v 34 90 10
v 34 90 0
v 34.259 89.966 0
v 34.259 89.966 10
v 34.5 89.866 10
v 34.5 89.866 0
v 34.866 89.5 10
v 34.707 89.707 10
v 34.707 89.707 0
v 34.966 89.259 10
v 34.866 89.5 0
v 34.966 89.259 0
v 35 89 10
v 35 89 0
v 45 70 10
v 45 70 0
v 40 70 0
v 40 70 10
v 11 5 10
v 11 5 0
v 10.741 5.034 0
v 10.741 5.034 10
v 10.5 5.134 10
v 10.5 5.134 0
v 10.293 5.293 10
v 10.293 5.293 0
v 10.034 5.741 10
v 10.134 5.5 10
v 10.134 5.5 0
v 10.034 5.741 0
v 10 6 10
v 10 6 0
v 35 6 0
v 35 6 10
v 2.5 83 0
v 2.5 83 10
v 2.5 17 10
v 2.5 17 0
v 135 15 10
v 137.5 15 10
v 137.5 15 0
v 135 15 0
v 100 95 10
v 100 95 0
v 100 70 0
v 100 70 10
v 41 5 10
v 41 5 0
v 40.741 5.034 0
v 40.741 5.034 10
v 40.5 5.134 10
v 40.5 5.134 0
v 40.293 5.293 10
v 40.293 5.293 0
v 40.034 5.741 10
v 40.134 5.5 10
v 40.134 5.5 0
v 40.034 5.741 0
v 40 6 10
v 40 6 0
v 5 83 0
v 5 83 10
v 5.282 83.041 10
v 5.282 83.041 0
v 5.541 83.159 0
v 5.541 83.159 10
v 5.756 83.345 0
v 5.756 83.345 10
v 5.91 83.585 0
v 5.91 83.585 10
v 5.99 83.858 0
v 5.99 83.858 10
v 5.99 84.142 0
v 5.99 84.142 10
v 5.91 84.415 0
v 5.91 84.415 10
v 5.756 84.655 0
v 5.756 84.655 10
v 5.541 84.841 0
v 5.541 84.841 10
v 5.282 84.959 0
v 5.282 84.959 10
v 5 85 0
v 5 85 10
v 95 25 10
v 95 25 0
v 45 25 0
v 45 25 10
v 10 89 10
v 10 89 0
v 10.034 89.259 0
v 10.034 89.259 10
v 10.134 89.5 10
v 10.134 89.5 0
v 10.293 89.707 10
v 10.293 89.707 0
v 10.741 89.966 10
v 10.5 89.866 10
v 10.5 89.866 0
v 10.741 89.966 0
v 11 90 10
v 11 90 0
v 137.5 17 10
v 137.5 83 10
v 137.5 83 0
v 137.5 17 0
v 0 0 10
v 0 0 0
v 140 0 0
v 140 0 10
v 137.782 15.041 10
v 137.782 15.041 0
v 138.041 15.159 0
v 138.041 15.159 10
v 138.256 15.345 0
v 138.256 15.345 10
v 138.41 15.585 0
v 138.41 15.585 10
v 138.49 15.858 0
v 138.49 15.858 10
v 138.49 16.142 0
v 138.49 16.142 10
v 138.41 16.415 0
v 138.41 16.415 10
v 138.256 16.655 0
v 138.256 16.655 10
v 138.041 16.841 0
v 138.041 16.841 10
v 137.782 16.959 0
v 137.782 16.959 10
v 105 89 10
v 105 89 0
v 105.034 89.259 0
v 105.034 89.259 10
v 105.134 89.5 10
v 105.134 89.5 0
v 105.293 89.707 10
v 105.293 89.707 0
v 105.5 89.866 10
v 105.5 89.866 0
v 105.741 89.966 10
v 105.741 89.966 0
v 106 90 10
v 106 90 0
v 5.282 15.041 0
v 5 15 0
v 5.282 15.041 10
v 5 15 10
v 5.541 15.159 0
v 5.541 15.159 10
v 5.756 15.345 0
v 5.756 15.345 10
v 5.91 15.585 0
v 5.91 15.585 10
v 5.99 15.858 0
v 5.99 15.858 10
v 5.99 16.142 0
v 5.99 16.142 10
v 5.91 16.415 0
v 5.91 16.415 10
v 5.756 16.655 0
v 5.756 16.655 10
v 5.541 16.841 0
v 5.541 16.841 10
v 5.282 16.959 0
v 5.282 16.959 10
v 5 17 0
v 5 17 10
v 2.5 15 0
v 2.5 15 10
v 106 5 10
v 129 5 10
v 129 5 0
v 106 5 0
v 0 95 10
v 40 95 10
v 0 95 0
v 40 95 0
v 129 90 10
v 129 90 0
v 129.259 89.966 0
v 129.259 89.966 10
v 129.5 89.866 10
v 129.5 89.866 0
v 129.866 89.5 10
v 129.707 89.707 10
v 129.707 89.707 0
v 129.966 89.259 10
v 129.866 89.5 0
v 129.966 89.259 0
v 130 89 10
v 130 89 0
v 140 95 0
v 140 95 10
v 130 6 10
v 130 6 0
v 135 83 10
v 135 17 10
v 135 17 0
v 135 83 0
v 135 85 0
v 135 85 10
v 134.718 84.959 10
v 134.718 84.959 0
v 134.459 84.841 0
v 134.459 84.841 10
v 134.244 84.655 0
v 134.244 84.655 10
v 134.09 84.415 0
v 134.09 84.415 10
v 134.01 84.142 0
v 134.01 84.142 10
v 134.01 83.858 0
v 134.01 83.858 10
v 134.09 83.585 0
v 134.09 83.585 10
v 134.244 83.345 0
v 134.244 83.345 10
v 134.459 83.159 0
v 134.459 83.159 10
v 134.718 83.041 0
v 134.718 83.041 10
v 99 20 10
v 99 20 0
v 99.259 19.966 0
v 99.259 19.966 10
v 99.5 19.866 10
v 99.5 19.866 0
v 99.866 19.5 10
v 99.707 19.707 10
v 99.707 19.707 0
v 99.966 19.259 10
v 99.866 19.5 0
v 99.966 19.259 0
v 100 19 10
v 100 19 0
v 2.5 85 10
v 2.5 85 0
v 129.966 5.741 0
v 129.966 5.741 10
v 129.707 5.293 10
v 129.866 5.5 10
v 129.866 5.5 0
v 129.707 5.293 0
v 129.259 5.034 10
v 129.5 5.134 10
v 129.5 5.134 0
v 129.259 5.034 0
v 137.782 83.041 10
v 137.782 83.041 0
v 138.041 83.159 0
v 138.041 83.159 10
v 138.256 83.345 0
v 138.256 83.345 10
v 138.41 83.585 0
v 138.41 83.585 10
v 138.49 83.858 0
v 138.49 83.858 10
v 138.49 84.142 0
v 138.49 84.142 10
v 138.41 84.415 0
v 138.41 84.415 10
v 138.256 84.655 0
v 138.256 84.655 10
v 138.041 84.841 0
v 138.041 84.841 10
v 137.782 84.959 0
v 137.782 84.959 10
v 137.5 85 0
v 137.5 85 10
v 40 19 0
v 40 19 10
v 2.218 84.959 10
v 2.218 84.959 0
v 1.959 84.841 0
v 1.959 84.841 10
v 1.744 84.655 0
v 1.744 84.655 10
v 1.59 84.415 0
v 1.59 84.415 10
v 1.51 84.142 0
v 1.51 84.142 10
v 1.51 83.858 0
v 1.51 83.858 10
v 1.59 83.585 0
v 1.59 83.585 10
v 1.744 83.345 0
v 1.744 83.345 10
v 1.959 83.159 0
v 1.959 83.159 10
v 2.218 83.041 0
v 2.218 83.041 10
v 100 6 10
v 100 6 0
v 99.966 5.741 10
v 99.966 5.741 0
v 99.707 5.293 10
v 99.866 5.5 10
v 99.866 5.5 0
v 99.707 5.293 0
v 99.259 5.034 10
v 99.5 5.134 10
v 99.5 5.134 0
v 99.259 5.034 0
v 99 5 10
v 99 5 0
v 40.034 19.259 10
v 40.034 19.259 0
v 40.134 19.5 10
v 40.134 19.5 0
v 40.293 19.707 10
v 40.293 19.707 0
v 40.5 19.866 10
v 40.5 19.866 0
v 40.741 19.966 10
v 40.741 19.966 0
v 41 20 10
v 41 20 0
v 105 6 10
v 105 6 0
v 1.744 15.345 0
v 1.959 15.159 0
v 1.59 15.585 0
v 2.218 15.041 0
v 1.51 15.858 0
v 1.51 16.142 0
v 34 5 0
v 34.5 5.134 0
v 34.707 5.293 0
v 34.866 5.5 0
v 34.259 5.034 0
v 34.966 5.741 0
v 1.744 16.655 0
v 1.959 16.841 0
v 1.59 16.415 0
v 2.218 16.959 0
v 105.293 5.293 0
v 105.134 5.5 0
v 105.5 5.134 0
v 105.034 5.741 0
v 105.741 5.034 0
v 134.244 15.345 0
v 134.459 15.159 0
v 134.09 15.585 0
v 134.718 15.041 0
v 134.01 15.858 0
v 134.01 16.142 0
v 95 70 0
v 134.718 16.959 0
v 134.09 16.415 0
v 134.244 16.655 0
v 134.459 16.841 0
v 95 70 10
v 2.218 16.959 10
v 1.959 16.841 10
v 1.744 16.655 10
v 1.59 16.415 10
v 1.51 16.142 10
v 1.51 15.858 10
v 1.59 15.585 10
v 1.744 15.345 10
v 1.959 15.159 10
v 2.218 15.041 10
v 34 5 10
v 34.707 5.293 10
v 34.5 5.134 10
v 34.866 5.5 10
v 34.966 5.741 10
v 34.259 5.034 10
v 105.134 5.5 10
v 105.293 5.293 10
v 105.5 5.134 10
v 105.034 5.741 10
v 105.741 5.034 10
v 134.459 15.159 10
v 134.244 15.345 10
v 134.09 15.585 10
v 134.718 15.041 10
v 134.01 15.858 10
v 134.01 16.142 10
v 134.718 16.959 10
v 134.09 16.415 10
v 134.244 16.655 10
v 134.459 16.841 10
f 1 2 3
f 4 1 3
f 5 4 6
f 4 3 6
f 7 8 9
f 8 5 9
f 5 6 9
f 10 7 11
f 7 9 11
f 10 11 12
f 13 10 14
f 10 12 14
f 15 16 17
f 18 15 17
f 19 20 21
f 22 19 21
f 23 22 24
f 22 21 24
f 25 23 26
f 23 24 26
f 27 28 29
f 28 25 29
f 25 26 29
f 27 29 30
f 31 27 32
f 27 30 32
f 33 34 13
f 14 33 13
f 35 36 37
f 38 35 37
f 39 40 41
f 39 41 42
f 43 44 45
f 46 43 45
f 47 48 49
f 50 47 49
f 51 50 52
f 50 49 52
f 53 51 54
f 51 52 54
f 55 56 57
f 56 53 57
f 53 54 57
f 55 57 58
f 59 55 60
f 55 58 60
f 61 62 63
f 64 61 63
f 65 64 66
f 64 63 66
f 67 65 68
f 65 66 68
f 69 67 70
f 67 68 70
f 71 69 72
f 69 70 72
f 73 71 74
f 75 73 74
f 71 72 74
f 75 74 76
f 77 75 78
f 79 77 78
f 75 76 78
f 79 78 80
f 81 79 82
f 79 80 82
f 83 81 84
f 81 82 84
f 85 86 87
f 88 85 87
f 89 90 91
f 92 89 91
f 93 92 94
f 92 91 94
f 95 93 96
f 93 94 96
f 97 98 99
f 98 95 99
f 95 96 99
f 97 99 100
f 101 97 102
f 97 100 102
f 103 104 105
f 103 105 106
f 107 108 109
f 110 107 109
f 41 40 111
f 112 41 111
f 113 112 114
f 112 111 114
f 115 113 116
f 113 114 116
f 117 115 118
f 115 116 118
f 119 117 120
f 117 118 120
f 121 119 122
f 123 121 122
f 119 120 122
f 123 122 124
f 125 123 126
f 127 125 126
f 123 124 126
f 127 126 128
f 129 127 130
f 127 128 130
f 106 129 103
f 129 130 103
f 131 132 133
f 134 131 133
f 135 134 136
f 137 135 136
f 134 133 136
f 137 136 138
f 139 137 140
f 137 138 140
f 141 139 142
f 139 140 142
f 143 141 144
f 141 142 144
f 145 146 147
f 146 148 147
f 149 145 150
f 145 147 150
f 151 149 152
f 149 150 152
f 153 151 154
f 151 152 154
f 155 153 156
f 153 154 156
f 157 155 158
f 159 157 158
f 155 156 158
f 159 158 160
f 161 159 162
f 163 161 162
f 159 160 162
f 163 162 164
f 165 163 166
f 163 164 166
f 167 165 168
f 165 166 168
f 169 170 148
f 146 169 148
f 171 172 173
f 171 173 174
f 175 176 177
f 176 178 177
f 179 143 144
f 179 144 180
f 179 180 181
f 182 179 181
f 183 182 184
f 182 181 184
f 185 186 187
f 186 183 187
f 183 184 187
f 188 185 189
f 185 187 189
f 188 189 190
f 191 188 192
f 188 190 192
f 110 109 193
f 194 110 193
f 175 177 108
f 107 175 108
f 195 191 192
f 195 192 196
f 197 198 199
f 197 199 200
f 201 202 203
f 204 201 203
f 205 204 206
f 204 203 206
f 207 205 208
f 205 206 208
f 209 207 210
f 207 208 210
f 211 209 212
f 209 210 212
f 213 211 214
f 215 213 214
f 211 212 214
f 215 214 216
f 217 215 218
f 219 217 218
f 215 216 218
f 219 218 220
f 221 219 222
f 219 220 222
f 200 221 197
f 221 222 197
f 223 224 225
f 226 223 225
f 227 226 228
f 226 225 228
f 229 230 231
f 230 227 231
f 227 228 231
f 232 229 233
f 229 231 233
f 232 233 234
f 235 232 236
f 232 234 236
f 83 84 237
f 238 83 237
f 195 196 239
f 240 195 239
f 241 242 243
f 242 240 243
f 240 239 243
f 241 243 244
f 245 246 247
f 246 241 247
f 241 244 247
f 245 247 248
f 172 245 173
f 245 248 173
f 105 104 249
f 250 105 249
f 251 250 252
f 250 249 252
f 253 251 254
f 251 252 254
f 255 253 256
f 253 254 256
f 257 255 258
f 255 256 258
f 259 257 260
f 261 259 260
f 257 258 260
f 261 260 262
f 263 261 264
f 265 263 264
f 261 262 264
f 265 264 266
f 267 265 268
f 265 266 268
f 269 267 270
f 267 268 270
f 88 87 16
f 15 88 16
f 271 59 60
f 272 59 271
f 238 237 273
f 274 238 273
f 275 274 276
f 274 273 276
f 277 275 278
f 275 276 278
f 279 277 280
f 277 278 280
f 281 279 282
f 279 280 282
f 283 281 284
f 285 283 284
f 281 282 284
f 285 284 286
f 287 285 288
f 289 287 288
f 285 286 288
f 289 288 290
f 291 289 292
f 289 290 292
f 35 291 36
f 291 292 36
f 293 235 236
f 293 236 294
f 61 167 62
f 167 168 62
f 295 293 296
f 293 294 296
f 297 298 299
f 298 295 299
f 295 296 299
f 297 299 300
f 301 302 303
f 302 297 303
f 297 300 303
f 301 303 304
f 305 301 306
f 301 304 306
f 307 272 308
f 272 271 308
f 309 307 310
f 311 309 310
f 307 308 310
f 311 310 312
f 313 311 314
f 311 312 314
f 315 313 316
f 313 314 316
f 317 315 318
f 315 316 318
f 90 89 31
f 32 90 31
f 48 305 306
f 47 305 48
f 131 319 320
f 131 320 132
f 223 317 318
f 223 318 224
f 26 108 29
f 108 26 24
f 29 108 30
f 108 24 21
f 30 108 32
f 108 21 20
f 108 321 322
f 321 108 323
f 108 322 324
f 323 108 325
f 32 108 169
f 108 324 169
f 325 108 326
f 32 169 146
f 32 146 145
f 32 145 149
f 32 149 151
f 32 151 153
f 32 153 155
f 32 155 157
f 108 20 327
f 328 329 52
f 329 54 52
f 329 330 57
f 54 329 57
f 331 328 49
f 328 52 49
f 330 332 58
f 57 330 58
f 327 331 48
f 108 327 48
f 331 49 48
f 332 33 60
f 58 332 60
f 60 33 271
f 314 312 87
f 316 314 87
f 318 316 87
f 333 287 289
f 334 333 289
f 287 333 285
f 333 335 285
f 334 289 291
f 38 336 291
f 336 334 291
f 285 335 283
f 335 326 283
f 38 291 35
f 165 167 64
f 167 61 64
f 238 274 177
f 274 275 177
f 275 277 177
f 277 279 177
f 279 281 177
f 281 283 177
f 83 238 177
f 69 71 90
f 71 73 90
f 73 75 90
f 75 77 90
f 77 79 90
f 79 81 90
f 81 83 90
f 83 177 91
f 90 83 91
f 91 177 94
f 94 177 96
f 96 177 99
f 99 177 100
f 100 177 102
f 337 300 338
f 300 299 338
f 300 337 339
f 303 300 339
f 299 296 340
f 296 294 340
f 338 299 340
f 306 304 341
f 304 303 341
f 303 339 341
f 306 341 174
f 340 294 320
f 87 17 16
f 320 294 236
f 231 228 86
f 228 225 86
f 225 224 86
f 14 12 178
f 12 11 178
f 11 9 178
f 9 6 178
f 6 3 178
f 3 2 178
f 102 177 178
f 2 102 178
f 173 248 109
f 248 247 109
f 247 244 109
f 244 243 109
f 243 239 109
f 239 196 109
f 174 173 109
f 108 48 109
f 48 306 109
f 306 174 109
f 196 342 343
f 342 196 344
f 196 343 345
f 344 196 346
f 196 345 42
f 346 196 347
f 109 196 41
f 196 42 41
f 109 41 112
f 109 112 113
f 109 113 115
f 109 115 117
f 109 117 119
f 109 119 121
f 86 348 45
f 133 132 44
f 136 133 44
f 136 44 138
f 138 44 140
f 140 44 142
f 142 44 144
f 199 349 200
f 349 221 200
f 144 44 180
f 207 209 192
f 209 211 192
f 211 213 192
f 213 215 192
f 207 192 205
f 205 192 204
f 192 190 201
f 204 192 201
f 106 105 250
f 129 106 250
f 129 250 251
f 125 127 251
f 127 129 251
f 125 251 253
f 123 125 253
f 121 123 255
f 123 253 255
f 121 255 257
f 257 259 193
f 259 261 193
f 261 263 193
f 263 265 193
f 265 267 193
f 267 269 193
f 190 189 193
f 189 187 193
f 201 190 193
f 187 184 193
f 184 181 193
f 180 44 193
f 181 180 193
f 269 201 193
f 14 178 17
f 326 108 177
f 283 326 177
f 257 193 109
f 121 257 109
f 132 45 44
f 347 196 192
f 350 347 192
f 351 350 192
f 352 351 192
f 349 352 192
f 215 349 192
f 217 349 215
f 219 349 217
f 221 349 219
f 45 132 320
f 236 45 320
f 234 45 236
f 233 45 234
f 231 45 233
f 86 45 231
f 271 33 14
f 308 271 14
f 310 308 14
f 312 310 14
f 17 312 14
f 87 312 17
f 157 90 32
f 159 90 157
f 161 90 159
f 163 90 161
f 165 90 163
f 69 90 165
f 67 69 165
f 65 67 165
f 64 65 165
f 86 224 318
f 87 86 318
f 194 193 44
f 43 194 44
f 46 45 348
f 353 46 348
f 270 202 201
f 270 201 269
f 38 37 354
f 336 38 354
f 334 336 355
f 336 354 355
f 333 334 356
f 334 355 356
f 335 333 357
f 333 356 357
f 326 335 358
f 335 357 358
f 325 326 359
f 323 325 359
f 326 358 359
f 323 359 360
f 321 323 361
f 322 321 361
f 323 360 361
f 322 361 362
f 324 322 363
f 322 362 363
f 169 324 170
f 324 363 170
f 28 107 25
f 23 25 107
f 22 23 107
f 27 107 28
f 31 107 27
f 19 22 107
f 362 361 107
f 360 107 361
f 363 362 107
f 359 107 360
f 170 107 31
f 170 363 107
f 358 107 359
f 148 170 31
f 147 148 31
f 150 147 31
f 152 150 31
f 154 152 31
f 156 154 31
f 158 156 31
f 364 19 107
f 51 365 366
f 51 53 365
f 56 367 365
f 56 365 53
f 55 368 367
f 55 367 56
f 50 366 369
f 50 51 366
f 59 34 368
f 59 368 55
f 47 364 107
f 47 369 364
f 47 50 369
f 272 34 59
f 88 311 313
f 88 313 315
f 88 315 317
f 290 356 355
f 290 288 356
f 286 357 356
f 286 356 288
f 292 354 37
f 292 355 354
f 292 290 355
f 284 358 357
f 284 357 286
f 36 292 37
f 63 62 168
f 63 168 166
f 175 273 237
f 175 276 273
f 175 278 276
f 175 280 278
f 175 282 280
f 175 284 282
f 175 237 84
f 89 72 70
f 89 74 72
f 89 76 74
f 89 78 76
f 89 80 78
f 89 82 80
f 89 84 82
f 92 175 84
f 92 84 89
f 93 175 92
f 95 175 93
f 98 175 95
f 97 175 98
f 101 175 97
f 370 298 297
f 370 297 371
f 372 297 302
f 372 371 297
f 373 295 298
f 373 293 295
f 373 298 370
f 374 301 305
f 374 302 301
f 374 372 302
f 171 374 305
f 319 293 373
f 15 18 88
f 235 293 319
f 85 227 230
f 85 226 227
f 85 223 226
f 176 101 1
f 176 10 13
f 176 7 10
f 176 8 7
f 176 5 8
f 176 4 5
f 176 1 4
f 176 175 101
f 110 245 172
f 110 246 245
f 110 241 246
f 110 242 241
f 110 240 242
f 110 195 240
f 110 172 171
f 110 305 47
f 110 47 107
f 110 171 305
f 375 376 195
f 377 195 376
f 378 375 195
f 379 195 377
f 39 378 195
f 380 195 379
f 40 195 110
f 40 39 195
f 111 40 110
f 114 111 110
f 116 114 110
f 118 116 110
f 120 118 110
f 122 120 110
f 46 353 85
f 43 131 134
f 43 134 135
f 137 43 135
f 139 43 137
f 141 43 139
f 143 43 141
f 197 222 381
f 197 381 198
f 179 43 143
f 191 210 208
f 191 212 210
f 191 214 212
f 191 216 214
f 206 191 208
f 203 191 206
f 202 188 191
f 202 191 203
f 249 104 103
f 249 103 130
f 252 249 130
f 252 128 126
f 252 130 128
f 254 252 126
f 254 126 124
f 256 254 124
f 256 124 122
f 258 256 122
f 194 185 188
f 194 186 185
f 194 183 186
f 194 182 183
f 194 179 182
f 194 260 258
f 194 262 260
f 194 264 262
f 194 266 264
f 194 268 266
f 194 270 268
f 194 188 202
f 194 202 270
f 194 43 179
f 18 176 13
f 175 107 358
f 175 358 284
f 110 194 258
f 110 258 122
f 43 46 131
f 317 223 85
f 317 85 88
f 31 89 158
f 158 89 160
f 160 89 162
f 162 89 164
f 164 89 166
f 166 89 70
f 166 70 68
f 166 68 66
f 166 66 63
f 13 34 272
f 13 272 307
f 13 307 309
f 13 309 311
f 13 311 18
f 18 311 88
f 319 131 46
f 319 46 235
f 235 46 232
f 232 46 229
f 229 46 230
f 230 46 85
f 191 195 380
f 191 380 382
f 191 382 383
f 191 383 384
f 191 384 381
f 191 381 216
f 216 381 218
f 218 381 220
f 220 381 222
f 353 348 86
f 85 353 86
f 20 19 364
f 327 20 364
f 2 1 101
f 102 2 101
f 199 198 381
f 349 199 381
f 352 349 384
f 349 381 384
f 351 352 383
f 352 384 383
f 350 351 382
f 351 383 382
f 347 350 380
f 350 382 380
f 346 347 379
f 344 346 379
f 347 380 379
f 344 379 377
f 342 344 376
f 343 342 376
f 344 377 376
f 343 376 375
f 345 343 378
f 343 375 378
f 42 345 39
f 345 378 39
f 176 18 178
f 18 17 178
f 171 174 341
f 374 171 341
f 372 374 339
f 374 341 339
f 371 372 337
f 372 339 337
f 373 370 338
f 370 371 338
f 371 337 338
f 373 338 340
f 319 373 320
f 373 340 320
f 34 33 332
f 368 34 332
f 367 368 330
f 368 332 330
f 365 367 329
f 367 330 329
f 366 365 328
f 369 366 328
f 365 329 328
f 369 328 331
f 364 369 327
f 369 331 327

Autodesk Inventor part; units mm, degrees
ref_plane "YZ Plane" through (0, 0, 0) normal (1, 0, 0) x (0, 1, 0)
ref_plane "XZ Plane" through (0, 0, 0) normal (0, 1, 0) x (-1, 0, 0)
ref_plane "XY Plane" through (0, 0, 0) normal (0, 0, 1) x (1, 0, 0)
sketch "スケッチ1" plane through (0, 0, 0) normal (0, 0, 1) x (1, 0, 0)
  line L0 (0, 0) -> (140, 0)
  line L1 (140, 0) -> (140, 95)
  line L2 (0, 95) -> (0, 0)
  line L3 (70, 94.6562) -> (70, 0) construction
  line L4 (95, 70) -> (95, 25)
  line L5 (95, 25) -> (45, 25)
  line L6 (45, 25) -> (45, 70)
  line L7 (140, 95) -> (100, 95)
  line L8 (40, 95) -> (0, 95)
  line L9 (100, 95) -> (100, 70)
  line L10 (40, 70) -> (40, 95)
  line L11 (100, 70) -> (95, 70)
  line L12 (45, 70) -> (40, 70)
  dimension "d0" = 140
  dimension "d1" = 95
  dimension "d2" = 25
  dimension "d3" = 50
  dimension "d4" = 60
  dimension "d6" = 25
extrude "押し出し1" add sketch "スケッチ1" along normal blind 10
sketch "スケッチ2" plane through (0, 0, 10) normal (0, 0, 1) x (1, 0, 0)
  line L0 (0, 0) -> (140, 0) projected
  line L1 (70, 0) -> (70, 25) construction
  line L2 (95, 25) -> (45, 25) projected
  line L3 (135, 85) -> (137.5, 85)
  line L4 (137.5, 83) -> (137.5, 17)
  line L5 (137.5, 15) -> (135, 15)
  line L6 (135, 17) -> (135, 83)
  line L7 (140, 95) -> (100, 95) projected
  line L8 (140, 0) -> (140, 95) projected
  arc A0 (135, 85) -> (135, 83) centre (135, 84) ccw
  arc A1 (137.5, 83) -> (137.5, 85) centre (137.5, 84) ccw
  arc A2 (135, 17) -> (135, 15) centre (135, 16) ccw
  arc A3 (137.5, 15) -> (137.5, 17) centre (137.5, 16) ccw
  line L9 (5, 85) -> (2.5, 85)
  line L10 (2.5, 83) -> (2.5, 17)
  line L11 (2.5, 15) -> (5, 15)
  line L12 (5, 17) -> (5, 83)
  arc A4 (5, 83) -> (5, 85) centre (5, 84) ccw
  arc A5 (2.5, 85) -> (2.5, 83) centre (2.5, 84) ccw
  arc A6 (5, 15) -> (5, 17) centre (5, 16) ccw
  arc A7 (2.5, 17) -> (2.5, 15) centre (2.5, 16) ccw
  dimension "d9" = 15
  dimension "d10" = 10
  dimension "d11" = 2.5
  dimension "d12" = 2.5
  dimension "d16" = 2
  dimension "d17" = 1
  dimension "d18" = 2
  dimension "d19" = 1
extrude "押し出し2" cut sketch "スケッチ2" against normal through all
sketch "スケッチ3" plane through (0, 0, 10) normal (0, 0, 1) x (1, 0, 0)
  line L0 (40, 20) -> (100, 20)
  line L1 (100, 20) -> (100, 5)
  line L2 (100, 5) -> (40, 5)
  line L3 (40, 5) -> (40, 20)
  arc A0 (135, 85) -> (135, 83) centre (135, 84) ccw projected
  line L4 (135, 85) -> (137.5, 85) projected
  arc A1 (137.5, 83) -> (137.5, 85) centre (137.5, 84) ccw projected
  line L5 (137.5, 83) -> (137.5, 17) projected
  arc A2 (137.5, 15) -> (137.5, 17) centre (137.5, 16) ccw projected
  line L6 (137.5, 15) -> (135, 15) projected
  arc A3 (135, 17) -> (135, 15) centre (135, 16) ccw projected
  line L7 (135, 17) -> (135, 83) projected
  arc A4 (5, 83) -> (5, 85) centre (5, 84) ccw projected
  line L8 (5, 83) -> (5, 17) projected
  arc A5 (5, 15) -> (5, 17) centre (5, 16) ccw projected
  line L9 (5, 15) -> (2.5, 15) projected
  arc A6 (2.5, 17) -> (2.5, 15) centre (2.5, 16) ccw projected
  line L10 (2.5, 17) -> (2.5, 83) projected
  arc A7 (2.5, 85) -> (2.5, 83) centre (2.5, 84) ccw projected
  line L11 (2.5, 85) -> (5, 85) projected
  line L12 (140, 0) -> (140, 95) projected
  line L13 (140, 95) -> (100, 95) projected
  line L14 (100, 95) -> (100, 70) projected
  line L15 (100, 70) -> (95, 70) projected
  line L16 (95, 70) -> (95, 25) projected
  line L17 (95, 25) -> (45, 25) projected
  line L18 (45, 25) -> (45, 70) projected
  line L19 (45, 70) -> (40, 70) projected
  line L20 (40, 70) -> (40, 95) projected
  line L21 (40, 95) -> (0, 95) projected
  line L22 (0, 95) -> (0, 0) projected
  line L23 (0, 0) -> (140, 0) projected
  line L24 (45, 25) -> (45, 70) projected
  line L25 (95, 70) -> (95, 25) projected
  line L26 (105, 90) -> (130, 90)
  line L27 (130, 90) -> (130, 5)
  line L28 (130, 5) -> (105, 5)
  line L29 (105, 5) -> (105, 90)
  line L30 (95, 25) -> (45, 25) projected
  line L31 (70, 25) -> (70, 0) construction
  line L32 (35, 90) -> (10, 90)
  line L33 (10, 90) -> (10, 5)
  line L34 (10, 5) -> (35, 5)
  line L35 (35, 5) -> (35, 90)
  dimension "d20" = 5
  dimension "d21" = 5
  dimension "d22" = 5
  dimension "d23" = 5
  dimension "d24" = 10
  dimension "d25" = 5
  dimension "d26" = 5
extrude "押し出し3" cut sketch "スケッチ3" against normal through all contours L0 L1 L2 L3 | L26 L27 L28 L29 | L35 L34 L33 L32
fillet "フィレット1" radius 1 12 edges at (35, 90, 5) (10, 90, 5) (10, 5, 5) (35, 5, 5) (40, 5, 5) (40, 20, 5) (100, 5, 5) (100, 20, 5) (130, 90, 5) (105, 90, 5) (105, 5, 5) (130, 5, 5)
properties part number "waist2" material "アルミニウム 6061"
